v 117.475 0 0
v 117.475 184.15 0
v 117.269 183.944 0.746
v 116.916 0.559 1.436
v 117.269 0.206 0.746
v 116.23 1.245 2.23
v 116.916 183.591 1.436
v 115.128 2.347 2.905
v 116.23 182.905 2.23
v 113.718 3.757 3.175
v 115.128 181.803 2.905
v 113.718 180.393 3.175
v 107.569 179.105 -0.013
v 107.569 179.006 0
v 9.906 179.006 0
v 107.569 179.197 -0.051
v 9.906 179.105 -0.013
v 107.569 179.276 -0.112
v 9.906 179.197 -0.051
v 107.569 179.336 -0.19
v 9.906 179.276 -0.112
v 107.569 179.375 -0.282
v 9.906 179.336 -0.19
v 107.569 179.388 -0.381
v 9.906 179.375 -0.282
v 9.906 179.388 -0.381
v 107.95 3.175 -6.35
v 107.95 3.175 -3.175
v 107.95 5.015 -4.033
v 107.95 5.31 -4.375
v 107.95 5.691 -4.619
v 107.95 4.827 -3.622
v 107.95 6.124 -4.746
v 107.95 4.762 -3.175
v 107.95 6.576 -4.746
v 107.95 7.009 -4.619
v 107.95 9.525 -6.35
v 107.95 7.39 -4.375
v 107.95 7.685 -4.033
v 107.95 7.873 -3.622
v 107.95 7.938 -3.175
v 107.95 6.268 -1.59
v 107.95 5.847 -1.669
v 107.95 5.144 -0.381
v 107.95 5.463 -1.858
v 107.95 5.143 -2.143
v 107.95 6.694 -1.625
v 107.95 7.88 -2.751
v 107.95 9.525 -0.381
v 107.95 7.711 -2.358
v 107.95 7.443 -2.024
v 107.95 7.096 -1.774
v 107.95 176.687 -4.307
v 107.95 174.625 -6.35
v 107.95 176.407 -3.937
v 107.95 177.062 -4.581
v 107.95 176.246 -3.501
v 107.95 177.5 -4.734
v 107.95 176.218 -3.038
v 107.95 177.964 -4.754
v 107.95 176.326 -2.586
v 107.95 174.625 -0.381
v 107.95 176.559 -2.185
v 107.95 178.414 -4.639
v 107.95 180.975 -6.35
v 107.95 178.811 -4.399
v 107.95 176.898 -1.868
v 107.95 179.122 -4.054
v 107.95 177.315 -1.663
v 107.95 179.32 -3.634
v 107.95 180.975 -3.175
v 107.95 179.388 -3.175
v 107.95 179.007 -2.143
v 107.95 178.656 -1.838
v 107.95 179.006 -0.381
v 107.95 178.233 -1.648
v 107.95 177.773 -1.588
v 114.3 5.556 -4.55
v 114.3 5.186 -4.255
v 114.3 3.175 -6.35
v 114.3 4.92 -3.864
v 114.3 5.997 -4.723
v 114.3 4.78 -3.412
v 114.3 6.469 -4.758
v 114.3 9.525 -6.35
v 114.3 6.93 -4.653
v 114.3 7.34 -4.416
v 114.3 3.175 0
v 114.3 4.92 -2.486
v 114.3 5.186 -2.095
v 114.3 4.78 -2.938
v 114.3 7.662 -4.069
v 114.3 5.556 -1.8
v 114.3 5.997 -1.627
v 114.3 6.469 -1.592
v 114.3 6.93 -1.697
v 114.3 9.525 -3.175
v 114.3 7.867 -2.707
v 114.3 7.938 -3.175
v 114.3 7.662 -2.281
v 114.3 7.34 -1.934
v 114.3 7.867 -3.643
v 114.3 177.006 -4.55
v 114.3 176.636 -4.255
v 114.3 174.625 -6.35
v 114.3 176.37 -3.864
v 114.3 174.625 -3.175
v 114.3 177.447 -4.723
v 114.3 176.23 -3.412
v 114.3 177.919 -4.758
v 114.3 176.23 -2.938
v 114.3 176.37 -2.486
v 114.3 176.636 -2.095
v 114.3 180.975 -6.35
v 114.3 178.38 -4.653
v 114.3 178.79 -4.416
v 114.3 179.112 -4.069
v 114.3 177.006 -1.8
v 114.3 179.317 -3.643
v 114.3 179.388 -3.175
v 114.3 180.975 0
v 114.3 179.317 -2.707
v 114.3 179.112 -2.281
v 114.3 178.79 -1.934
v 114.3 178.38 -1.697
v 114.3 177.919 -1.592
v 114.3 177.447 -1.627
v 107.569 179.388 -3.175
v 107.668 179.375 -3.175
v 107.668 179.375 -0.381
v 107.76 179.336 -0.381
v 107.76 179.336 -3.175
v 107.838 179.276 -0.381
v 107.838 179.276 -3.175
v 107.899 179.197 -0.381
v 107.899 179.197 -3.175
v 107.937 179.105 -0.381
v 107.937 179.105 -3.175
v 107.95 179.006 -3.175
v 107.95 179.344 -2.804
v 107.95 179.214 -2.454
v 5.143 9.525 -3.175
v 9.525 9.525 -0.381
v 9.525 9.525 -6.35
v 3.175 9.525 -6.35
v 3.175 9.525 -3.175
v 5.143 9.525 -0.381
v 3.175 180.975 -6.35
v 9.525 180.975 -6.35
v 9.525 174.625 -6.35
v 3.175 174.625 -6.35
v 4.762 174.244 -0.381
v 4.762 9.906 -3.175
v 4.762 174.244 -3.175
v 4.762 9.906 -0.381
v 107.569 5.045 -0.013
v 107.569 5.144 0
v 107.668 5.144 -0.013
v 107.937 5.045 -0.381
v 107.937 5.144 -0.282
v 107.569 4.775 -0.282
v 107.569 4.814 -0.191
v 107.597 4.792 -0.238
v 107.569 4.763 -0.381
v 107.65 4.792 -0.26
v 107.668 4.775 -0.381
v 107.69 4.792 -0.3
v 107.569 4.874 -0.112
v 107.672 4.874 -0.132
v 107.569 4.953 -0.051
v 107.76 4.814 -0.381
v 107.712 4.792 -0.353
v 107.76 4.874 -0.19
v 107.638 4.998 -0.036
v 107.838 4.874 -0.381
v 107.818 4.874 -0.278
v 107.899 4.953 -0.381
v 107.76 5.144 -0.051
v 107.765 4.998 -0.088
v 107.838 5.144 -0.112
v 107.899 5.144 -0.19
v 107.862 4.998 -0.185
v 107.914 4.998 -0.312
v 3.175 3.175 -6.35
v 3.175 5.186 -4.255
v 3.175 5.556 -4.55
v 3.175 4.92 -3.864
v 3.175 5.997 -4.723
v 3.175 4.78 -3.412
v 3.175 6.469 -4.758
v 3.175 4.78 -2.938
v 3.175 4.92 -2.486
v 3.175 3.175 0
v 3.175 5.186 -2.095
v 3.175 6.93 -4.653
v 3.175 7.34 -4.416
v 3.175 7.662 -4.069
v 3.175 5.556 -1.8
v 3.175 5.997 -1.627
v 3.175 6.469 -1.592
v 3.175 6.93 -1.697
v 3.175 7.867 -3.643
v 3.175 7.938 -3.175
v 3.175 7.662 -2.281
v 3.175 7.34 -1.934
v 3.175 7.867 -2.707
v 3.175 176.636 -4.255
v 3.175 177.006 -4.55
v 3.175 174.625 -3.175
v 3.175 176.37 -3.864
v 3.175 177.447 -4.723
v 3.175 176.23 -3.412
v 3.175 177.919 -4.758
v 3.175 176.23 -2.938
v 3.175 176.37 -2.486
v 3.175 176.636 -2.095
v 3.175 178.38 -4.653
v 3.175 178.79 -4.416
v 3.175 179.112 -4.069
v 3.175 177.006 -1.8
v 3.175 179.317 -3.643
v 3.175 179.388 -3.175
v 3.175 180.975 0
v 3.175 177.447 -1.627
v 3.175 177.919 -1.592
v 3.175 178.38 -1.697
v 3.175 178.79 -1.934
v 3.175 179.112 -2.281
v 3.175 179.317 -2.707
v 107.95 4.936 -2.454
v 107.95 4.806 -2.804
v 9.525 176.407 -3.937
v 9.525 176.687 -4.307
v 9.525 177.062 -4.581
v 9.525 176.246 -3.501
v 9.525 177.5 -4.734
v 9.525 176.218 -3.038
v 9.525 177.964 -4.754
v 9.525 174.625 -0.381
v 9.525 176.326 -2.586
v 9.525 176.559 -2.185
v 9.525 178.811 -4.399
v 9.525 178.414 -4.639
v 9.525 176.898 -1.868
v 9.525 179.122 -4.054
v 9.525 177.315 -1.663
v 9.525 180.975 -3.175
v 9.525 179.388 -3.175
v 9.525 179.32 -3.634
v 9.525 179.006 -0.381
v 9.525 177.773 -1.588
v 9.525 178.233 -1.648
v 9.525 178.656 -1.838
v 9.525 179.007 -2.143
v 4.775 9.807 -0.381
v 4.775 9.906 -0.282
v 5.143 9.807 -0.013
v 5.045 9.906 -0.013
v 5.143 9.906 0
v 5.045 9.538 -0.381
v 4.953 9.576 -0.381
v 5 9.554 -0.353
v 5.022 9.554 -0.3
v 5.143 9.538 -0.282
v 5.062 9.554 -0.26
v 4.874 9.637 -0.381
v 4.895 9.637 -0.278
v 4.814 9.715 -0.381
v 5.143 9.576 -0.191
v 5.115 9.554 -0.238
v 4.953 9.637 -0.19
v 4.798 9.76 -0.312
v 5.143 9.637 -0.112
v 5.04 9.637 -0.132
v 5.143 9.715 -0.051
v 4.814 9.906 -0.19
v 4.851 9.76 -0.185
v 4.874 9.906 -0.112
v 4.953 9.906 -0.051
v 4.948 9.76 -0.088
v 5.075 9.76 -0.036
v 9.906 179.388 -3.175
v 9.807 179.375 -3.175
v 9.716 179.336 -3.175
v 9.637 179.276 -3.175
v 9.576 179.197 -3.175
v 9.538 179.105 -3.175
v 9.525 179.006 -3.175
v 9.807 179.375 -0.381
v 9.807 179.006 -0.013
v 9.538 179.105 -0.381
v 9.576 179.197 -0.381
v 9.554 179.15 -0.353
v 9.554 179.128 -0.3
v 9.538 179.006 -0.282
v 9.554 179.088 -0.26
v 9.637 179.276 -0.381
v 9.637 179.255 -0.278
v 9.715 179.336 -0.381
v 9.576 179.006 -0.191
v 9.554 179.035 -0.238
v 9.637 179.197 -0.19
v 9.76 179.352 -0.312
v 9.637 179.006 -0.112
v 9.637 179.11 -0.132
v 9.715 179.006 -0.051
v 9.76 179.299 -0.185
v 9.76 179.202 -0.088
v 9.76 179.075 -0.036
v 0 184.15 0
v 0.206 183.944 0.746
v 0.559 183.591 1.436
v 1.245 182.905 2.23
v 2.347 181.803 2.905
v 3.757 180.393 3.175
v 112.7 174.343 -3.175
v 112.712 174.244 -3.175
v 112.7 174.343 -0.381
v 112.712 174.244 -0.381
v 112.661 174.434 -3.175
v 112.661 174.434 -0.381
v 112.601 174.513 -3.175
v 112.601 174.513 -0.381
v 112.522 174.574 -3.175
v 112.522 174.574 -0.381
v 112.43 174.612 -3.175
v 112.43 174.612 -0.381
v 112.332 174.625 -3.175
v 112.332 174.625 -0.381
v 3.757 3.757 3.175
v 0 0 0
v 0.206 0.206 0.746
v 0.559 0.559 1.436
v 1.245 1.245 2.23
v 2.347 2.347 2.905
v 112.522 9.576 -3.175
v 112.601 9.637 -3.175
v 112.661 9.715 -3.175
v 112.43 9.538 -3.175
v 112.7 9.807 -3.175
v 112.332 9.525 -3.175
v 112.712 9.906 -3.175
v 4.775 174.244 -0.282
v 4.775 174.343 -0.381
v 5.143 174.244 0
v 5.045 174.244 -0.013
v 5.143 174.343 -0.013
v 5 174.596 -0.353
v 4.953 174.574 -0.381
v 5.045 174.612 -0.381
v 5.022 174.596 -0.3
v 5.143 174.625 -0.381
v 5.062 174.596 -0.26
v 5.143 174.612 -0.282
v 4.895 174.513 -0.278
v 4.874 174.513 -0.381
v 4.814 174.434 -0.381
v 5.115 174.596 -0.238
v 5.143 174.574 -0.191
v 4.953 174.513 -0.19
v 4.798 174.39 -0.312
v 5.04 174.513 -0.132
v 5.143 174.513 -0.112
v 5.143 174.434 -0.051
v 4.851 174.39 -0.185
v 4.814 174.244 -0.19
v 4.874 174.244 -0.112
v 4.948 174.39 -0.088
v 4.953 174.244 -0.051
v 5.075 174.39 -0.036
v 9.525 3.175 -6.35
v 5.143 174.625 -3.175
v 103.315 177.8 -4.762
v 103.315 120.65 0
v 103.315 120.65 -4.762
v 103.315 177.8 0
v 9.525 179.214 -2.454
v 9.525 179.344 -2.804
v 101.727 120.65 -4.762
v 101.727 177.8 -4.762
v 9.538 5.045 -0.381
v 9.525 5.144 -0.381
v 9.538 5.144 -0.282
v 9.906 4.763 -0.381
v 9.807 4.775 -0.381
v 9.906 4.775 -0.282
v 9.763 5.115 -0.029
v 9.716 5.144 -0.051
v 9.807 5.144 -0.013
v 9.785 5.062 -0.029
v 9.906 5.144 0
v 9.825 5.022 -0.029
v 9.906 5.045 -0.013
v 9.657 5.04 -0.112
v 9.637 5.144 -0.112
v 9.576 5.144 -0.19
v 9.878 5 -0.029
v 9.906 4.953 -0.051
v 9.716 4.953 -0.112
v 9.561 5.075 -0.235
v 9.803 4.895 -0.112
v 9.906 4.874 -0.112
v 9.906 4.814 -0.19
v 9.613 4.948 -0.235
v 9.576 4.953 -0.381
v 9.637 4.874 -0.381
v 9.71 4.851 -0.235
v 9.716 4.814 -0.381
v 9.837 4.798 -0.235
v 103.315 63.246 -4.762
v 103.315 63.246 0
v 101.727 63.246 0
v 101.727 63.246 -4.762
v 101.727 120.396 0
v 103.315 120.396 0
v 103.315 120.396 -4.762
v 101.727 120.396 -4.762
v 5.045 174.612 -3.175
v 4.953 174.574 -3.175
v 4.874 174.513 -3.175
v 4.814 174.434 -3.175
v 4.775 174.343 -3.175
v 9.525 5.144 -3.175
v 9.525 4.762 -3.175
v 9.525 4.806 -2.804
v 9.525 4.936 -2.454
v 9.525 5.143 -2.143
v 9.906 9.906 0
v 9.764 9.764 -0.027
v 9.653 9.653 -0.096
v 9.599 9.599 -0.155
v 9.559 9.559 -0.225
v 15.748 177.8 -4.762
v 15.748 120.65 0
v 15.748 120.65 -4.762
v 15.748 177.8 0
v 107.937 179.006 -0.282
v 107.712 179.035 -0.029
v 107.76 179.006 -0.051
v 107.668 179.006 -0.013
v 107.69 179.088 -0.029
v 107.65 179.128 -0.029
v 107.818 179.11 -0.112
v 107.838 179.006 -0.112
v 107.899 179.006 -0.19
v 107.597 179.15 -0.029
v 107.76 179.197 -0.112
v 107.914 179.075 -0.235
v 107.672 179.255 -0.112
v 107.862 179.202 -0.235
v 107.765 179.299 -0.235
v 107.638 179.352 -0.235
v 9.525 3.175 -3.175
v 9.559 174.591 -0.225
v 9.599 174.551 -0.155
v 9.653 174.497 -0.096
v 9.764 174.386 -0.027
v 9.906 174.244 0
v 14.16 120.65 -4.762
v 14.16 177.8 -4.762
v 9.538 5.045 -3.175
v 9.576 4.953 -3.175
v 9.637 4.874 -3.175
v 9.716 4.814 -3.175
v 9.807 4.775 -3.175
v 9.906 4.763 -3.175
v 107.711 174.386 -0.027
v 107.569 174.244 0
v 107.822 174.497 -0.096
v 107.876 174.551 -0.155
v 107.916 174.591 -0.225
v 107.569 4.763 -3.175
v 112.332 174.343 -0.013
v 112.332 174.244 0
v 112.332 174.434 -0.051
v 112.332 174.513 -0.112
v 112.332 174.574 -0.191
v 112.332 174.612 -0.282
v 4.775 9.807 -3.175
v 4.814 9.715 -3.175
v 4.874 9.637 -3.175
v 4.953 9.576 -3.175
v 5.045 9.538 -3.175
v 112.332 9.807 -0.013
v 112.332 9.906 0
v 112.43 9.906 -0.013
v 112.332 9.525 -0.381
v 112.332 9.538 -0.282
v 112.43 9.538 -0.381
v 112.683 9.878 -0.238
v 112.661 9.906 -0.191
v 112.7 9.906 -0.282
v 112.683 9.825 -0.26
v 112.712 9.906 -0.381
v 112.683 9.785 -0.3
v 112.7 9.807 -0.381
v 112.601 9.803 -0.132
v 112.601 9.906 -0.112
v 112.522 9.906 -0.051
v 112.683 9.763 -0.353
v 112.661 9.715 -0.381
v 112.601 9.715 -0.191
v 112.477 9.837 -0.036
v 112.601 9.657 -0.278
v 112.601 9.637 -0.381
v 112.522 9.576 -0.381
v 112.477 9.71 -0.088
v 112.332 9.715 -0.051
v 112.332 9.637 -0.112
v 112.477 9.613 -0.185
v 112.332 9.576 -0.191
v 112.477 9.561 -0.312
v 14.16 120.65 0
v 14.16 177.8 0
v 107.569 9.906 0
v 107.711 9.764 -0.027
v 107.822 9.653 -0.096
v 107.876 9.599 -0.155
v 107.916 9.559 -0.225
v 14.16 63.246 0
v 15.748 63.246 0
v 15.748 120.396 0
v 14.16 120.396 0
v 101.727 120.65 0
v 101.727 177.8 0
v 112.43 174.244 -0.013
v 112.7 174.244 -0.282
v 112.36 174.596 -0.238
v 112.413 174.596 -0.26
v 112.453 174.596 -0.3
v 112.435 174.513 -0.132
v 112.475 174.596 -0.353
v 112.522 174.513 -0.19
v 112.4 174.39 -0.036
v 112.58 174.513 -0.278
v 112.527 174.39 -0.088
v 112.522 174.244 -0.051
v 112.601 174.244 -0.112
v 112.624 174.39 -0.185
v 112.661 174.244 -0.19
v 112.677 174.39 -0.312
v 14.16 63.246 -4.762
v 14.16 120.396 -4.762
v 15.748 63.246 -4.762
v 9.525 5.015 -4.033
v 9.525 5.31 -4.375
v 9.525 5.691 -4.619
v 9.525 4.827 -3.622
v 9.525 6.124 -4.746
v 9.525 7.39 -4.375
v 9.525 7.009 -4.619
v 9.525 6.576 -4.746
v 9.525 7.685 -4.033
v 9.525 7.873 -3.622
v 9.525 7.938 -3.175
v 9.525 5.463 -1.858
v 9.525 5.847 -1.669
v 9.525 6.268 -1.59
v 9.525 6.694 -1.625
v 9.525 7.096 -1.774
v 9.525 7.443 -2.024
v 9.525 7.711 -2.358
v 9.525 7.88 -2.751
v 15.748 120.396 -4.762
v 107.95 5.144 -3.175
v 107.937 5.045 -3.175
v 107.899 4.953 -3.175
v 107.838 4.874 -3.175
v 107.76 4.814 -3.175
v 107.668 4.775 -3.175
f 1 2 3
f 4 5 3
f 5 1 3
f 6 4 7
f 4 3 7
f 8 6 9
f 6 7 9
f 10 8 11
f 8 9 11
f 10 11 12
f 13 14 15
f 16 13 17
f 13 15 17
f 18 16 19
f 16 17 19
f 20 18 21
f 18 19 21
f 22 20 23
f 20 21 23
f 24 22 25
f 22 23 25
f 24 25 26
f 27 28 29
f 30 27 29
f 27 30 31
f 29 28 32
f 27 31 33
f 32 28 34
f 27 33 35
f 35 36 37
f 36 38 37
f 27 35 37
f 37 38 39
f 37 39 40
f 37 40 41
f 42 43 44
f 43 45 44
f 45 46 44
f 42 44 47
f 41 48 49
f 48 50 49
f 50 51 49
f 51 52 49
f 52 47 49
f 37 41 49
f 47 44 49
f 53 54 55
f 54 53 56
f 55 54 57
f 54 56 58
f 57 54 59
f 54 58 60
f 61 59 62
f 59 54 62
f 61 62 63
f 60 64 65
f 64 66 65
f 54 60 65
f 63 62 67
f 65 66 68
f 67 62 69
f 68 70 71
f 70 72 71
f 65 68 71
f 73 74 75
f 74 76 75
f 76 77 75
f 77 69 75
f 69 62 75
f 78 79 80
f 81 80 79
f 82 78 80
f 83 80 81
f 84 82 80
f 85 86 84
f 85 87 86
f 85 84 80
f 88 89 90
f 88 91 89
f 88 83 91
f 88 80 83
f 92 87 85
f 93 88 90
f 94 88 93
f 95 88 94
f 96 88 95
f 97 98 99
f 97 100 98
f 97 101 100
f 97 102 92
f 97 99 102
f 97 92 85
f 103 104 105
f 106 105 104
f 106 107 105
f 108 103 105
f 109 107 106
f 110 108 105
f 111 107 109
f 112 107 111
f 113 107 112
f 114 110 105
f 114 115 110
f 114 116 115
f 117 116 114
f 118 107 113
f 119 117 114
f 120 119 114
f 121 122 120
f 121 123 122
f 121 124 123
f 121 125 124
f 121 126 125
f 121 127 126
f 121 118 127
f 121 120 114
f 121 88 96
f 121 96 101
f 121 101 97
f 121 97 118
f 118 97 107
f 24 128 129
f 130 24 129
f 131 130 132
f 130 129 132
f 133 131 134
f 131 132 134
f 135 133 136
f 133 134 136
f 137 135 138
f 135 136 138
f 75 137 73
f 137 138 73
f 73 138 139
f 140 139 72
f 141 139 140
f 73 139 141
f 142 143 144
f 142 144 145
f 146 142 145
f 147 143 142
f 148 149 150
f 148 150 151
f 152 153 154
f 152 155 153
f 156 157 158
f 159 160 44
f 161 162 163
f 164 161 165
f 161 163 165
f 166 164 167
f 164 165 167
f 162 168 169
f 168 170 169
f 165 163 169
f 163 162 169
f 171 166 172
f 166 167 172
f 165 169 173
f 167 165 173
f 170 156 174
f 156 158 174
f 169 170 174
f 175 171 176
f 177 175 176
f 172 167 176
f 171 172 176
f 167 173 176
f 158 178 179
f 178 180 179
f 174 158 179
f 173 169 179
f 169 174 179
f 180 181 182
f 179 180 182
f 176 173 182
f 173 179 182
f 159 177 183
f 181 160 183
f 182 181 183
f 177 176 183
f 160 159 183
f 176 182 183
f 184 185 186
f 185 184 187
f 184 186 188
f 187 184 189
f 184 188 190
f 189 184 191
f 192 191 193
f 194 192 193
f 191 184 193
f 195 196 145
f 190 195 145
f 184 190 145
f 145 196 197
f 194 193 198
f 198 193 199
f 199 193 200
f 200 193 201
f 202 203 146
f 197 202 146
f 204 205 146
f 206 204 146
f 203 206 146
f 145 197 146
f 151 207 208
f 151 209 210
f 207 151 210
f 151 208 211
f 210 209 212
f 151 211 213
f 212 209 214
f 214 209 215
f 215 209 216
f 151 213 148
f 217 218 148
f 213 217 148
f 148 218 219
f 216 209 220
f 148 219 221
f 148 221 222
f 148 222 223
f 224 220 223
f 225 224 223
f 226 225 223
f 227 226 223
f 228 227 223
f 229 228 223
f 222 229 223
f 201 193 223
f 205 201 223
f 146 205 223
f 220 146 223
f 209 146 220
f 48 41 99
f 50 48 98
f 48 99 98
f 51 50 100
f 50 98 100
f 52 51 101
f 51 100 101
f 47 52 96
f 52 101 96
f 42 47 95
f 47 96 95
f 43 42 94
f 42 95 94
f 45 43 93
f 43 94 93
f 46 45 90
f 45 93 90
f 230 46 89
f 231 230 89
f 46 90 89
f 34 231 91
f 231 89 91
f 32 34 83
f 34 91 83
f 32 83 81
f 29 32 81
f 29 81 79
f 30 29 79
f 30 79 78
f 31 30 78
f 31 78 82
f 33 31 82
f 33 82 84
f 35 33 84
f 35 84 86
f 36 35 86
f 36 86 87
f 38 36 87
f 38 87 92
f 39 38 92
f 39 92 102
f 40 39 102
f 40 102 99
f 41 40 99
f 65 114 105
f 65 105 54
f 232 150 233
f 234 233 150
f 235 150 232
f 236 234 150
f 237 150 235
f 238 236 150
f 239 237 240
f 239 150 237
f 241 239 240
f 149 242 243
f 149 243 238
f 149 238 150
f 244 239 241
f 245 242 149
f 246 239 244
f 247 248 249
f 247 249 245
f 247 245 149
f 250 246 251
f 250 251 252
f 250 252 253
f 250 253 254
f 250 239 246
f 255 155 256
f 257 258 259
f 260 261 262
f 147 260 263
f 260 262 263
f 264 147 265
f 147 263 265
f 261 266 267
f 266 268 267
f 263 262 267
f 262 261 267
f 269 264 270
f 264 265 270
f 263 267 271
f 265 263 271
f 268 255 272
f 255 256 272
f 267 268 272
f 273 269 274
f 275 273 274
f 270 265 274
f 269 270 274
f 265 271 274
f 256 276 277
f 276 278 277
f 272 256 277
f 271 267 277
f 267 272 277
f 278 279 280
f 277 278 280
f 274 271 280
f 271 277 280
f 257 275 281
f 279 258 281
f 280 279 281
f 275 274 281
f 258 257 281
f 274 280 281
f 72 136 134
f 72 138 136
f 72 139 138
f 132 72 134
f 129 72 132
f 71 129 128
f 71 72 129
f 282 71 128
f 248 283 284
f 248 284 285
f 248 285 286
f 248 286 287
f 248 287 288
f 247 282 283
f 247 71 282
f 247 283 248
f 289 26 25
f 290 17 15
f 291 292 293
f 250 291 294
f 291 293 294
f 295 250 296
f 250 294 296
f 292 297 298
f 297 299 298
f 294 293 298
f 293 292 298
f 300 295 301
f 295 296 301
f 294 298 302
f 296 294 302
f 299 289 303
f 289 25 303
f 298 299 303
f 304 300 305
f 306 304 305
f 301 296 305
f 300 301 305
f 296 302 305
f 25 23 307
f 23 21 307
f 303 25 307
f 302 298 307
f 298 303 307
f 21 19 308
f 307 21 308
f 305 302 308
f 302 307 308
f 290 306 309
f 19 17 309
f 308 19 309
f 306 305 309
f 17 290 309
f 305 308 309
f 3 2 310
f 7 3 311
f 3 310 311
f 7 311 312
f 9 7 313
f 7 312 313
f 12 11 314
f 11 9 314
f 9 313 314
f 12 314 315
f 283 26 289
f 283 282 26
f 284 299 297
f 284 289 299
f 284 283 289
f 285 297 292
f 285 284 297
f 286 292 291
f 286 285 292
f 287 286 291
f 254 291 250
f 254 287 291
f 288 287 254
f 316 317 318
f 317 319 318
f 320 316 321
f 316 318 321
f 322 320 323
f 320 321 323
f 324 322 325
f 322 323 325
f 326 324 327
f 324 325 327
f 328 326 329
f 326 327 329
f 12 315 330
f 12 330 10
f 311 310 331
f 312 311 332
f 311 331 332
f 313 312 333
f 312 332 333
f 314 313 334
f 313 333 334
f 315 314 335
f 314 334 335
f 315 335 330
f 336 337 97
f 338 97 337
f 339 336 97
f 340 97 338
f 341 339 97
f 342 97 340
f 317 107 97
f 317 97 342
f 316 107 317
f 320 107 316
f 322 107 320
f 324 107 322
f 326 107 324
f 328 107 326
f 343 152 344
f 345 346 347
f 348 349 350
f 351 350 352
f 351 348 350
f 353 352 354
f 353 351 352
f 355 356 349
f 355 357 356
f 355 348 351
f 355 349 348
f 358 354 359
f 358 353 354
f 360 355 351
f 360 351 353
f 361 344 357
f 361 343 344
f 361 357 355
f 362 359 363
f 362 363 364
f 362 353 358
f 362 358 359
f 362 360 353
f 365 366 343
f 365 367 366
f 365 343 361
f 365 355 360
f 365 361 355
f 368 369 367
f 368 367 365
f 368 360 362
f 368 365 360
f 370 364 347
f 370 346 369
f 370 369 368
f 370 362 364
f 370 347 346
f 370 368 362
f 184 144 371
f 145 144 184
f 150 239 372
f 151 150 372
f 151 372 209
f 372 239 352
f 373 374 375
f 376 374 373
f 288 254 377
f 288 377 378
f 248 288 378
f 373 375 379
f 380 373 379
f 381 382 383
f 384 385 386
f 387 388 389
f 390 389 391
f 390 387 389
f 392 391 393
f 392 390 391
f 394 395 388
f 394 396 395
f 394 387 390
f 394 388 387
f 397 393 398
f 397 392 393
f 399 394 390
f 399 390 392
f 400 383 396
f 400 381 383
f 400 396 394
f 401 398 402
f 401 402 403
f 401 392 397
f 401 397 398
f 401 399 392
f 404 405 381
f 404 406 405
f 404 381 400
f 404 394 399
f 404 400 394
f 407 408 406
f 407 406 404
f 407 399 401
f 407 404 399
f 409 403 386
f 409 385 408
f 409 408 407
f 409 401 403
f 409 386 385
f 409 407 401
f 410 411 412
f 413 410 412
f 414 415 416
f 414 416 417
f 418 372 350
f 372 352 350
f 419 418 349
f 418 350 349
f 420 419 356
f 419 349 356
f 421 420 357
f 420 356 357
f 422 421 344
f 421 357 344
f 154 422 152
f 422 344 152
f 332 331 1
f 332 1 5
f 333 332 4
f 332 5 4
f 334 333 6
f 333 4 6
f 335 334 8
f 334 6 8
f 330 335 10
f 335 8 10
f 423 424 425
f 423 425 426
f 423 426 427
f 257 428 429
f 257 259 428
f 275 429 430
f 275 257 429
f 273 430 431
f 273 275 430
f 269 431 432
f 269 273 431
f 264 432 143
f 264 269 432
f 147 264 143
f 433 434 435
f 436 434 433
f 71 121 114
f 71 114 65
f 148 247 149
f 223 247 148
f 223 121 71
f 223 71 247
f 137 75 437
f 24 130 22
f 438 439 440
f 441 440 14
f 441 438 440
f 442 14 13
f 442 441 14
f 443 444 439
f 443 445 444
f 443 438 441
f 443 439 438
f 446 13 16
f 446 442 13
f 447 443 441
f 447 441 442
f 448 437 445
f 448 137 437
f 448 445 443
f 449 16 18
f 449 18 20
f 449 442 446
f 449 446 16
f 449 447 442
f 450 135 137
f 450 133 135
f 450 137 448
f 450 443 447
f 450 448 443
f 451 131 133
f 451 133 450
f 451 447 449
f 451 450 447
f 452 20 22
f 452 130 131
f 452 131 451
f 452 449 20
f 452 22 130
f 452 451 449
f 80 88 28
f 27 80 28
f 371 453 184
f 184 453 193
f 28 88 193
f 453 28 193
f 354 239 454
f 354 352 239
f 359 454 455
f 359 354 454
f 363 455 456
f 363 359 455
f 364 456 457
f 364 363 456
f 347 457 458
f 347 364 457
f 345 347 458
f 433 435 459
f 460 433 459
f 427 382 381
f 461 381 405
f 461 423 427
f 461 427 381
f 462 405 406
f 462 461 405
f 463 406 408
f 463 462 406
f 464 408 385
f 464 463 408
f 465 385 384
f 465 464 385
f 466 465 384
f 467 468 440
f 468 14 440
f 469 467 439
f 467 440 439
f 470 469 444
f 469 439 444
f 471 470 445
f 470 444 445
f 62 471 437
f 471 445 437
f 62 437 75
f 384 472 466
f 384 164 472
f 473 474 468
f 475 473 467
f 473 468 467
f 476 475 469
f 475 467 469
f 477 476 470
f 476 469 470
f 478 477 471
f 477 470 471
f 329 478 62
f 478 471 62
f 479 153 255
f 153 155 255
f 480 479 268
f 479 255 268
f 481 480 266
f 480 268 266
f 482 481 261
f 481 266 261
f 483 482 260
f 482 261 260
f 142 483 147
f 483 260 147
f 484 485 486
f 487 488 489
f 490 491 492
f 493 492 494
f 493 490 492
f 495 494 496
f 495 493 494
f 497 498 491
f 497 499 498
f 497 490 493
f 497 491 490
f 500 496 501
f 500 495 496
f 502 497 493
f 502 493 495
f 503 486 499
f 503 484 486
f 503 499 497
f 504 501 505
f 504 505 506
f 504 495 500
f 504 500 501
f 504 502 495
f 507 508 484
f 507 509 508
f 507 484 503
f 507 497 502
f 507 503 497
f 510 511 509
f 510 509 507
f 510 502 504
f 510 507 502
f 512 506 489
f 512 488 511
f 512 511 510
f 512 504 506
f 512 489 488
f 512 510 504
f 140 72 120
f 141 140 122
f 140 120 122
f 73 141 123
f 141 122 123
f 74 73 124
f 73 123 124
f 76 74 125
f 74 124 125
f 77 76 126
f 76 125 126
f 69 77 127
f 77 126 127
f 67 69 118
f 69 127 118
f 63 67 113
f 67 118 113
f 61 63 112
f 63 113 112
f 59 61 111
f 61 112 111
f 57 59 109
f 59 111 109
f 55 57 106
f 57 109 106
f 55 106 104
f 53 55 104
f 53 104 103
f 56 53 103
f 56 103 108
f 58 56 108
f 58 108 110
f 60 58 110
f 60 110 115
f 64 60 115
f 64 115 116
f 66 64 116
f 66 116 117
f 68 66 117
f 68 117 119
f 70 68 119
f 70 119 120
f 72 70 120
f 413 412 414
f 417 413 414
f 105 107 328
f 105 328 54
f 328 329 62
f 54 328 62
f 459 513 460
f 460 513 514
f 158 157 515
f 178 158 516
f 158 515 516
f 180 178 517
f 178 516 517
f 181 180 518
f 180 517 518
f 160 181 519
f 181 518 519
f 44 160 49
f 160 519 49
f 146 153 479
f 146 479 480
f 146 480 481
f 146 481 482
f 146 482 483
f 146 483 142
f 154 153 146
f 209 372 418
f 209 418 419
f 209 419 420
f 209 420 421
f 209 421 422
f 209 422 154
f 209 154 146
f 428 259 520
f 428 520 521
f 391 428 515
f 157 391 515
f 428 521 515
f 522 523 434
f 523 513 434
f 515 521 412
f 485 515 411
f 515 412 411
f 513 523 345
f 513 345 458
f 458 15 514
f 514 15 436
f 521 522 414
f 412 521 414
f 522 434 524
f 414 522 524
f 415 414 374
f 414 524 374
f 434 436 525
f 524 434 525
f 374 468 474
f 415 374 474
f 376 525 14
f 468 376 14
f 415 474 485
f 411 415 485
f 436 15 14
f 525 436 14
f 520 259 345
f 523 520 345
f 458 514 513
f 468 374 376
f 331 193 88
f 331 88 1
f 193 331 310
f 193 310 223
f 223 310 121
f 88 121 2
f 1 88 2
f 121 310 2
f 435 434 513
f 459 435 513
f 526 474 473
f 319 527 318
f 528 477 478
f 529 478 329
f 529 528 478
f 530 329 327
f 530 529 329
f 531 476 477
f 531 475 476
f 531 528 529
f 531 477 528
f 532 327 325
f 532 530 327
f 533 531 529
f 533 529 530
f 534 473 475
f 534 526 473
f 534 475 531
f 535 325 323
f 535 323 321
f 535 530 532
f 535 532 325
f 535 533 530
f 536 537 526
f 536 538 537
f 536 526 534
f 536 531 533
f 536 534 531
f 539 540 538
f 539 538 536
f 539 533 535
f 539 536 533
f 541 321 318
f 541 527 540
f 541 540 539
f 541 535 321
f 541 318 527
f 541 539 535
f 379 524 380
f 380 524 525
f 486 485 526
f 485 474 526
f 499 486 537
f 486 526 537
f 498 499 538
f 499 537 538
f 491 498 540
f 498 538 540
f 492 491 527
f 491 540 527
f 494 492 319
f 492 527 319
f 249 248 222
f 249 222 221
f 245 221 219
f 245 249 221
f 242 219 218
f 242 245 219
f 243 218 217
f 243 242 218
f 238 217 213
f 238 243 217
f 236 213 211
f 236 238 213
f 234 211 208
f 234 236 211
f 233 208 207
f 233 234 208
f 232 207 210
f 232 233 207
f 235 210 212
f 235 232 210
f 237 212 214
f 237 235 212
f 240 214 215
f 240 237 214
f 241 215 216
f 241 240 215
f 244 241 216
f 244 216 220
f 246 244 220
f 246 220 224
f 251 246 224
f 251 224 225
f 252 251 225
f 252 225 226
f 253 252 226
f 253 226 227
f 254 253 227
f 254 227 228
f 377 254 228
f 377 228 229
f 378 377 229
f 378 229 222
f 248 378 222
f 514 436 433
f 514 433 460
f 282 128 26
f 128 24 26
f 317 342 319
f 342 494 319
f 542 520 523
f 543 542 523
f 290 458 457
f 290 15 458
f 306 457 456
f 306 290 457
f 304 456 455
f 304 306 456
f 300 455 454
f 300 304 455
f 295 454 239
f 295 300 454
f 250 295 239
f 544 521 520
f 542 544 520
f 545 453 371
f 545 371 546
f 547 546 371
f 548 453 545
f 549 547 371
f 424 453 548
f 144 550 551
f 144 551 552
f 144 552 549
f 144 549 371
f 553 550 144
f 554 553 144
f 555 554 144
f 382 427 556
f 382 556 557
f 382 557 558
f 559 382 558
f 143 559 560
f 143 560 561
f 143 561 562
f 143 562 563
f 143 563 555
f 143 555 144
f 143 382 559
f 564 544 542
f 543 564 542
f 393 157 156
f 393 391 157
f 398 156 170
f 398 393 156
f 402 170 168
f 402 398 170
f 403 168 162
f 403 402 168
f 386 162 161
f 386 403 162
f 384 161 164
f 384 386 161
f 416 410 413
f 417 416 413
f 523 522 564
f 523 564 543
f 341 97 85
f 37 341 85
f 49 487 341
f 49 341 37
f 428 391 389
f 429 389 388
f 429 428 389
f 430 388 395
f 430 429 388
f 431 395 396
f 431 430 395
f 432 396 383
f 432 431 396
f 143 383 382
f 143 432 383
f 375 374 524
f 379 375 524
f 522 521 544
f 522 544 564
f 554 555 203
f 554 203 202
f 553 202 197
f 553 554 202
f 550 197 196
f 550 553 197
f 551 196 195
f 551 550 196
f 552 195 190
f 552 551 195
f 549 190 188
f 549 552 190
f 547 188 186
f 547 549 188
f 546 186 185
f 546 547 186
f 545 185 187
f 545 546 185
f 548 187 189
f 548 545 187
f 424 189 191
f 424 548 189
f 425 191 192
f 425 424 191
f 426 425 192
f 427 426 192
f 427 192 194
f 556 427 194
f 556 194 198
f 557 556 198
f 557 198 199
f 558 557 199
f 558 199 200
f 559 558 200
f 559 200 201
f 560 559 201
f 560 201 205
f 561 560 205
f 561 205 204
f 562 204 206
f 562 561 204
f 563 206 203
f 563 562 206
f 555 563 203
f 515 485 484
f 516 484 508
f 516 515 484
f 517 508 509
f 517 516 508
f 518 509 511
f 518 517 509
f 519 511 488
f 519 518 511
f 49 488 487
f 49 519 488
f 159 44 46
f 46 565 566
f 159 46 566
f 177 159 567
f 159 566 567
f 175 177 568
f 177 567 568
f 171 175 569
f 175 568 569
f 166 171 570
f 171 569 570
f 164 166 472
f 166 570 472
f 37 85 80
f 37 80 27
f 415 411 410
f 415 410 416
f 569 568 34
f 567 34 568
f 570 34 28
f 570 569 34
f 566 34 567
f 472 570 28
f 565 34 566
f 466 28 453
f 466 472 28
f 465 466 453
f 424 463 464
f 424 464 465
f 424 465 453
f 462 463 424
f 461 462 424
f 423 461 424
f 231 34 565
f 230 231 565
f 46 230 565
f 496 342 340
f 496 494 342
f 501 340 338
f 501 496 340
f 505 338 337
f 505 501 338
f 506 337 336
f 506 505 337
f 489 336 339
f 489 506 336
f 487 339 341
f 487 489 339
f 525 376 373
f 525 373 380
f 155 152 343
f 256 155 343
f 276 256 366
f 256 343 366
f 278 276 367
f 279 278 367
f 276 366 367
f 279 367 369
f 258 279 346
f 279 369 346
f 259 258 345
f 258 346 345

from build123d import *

# Parameters (mm, degrees)
SKETCH3_W           = 117.475
SKETCH3_H           = 184.15
BOSS_EXTRUDE2_DEPTH = 3.175
FILLET1_R           = 3.81
SKETCH13_W          = 111.125
SKETCH13_H          = 177.8
SKETCH13_W_2        = 107.95
SKETCH13_H_2        = 174.625
BOSS_EXTRUDE4_DEPTH = 3.175
SKETCH14_W          = 6.35
SKETCH14_H          = 6.35
BOSS_EXTRUDE5_DEPTH = 6.35
FILLET9_R           = 0.381
SKETCH15_R          = 1.5875
CUT_EXTRUDE9_DEPTH  = 6.35
CUT_EXTRUDE10_START = -6.35
SKETCH16_R          = 1.5875
CUT_EXTRUDE10_DEPTH = 6.35
SKETCH17_W          = 1.5875
SKETCH17_H          = 57.15
BOSS_EXTRUDE6_DEPTH = 4.7625
SKETCH18_W          = 1.5875
SKETCH18_H          = 57.15
BOSS_EXTRUDE7_DEPTH = 4.7625


with BuildPart() as part:
    # Sketch3 → Boss-Extrude2 (new body)
    with BuildSketch(Plane.XY):
        with Locations((58.7375, 92.075)):
            Rectangle(SKETCH3_W, SKETCH3_H)
    extrude(amount=BOSS_EXTRUDE2_DEPTH)

    # Fillet1
    # the kernel refuses this fillet: 3.81 mm, written as the material it takes off along each edge
    with BuildSketch(Plane(origin=(126.866776656, 0, 3.175), x_dir=(0, 0, -1), z_dir=(-1, 0, 0)), Plane(origin=(-9.391776656, 184.15, 3.175), x_dir=(0, 0, -1), z_dir=(1, 0, 0))) as fillet1_piece_1:
        with BuildLine():
            CenterArc((3.81, -3.756710662), FILLET1_R, 99.594068227, 80.405931773)
            Line((0, -3.756710662), (-0.0762, -3.756710662))
            Line((-0.0762, -3.756710662), (-0.0762, 0))
            Line((-0.0762, 0), (0, 0.0762))
            ThreePointArc((0, 0.0762), (1.5875, 0.0762), (3.1623, 0.075134213))
            Line((3.1623, 0.075134213), (3.175, 0))
        make_face()
    extrude(amount=136.258553311, mode=Mode.SUBTRACT)
    with BuildSketch(Plane(origin=(117.475, 193.541776656, 3.175), x_dir=(0, 0, -1), z_dir=(0, -1, 0)), Plane(origin=(0, -9.391776656, 3.175), x_dir=(0, 0, -1), z_dir=(0, 1, 0))) as fillet1_piece_2:
        with BuildLine():
            CenterArc((3.81, -3.756710662), FILLET1_R, 99.594068227, 80.405931773)
            Line((0, -3.756710662), (-0.0762, -3.756710662))
            Line((-0.0762, -3.756710662), (-0.0762, 0))
            Line((-0.0762, 0), (0, 0.0762))
            ThreePointArc((0, 0.0762), (1.5875, 0.0762), (3.1623, 0.075134213))
            Line((3.1623, 0.075134213), (3.175, 0))
        make_face()
    extrude(amount=202.933553311, mode=Mode.SUBTRACT)

    # Sketch13 → Boss-Extrude4 (add)
    with BuildSketch(Plane(origin=(0, 0, 0), x_dir=(-1, 0, 0), z_dir=(0, 0, -1))):
        with Locations((-58.7375, 92.075)):
            Rectangle(SKETCH13_W, SKETCH13_H)
        with Locations((-58.7375, 92.075)):
            Rectangle(SKETCH13_W_2, SKETCH13_H_2, mode=Mode.SUBTRACT)
    extrude(amount=BOSS_EXTRUDE4_DEPTH)

    # Sketch14 → Boss-Extrude5 (add)
    with BuildSketch(Plane(origin=(0, 0, 0), x_dir=(-1, 0, 0), z_dir=(0, 0, -1))):
        with Locations((-111.125, 177.8)):
            Rectangle(SKETCH14_W, SKETCH14_H)
        with Locations((-6.35, 177.8)):
            Rectangle(SKETCH14_W, SKETCH14_H)
        with Locations((-111.125, 6.35)):
            Rectangle(SKETCH14_W, SKETCH14_H)
        with Locations((-6.35, 6.35)):
            Rectangle(SKETCH14_W, SKETCH14_H)
    extrude(amount=BOSS_EXTRUDE5_DEPTH)

    # Fillet9
    fillet9_edges = [part.edges().sort_by_distance(p)[0] for p in [
        (107.95, 7.14375, 0),
        (110.33125, 9.525, 0),
        (4.7625, 92.075, 0),
        (9.525, 4.7625, -1.5875),
        (4.7625, 9.525, -1.5875),
        (7.14375, 9.525, 0),
        (9.525, 7.14375, 0),
        (112.7125, 92.075, 0),
        (110.33125, 174.625, 0),
        (112.7125, 174.625, -1.5875),
        (107.95, 179.3875, -1.5875),
        (107.95, 177.00625, 0),
        (4.7625, 174.625, -1.5875),
        (58.7375, 179.3875, 0),
        (9.525, 179.3875, -1.5875),
        (9.525, 177.00625, 0),
        (7.14375, 174.625, 0),
        (58.7375, 4.7625, 0),
        (107.95, 4.7625, -1.5875),
        (112.7125, 9.525, -1.5875),
    ]]
    fillet(fillet9_edges, radius=FILLET9_R)

    # Sketch15 → Cut-Extrude9 (cut)
    with BuildSketch(Plane(origin=(114.3, 0, 0), x_dir=(0, 0, -1), z_dir=(1, 0, 0))):
        with Locations(Location((3.175, 6.35, 0), (0, 0, 90))):
            Circle(SKETCH15_R)
        with Locations(Location((3.175, 177.8, 0), (0, 0, 90))):
            Circle(SKETCH15_R)
    extrude(amount=-CUT_EXTRUDE9_DEPTH, mode=Mode.SUBTRACT)

    # Sketch16 → Cut-Extrude10 (cut)
    with BuildSketch(Plane.ZY.offset(-3.175).offset(CUT_EXTRUDE10_START)):
        with Locations(Location((-3.175, 177.8, 0), (0, 0, 90))):
            Circle(SKETCH16_R)
        with Locations(Location((-3.175, 6.35, 0), (0, 0, 90))):
            Circle(SKETCH16_R)
    extrude(amount=CUT_EXTRUDE10_DEPTH, mode=Mode.SUBTRACT)

    # Sketch17 → Boss-Extrude6 (add)
    with BuildSketch(Plane(origin=(0, 0, 0), x_dir=(-1, 0, 0), z_dir=(0, 0, -1))):
        with Locations((-102.52075, 149.225)):
            Rectangle(SKETCH17_W, SKETCH17_H)
        with Locations((-14.95425, 149.225)):
            Rectangle(SKETCH17_W, SKETCH17_H)
    extrude(amount=BOSS_EXTRUDE6_DEPTH)

    # Sketch18 → Boss-Extrude7 (add)
    with BuildSketch(Plane(origin=(0, 0, 0), x_dir=(-1, 0, 0), z_dir=(0, 0, -1))):
        with Locations((-102.52075, 91.821)):
            Rectangle(SKETCH18_W, SKETCH18_H)
        with Locations((-14.95425, 91.821)):
            Rectangle(SKETCH18_W, SKETCH18_H)
    extrude(amount=BOSS_EXTRUDE7_DEPTH)


solid = part.part
